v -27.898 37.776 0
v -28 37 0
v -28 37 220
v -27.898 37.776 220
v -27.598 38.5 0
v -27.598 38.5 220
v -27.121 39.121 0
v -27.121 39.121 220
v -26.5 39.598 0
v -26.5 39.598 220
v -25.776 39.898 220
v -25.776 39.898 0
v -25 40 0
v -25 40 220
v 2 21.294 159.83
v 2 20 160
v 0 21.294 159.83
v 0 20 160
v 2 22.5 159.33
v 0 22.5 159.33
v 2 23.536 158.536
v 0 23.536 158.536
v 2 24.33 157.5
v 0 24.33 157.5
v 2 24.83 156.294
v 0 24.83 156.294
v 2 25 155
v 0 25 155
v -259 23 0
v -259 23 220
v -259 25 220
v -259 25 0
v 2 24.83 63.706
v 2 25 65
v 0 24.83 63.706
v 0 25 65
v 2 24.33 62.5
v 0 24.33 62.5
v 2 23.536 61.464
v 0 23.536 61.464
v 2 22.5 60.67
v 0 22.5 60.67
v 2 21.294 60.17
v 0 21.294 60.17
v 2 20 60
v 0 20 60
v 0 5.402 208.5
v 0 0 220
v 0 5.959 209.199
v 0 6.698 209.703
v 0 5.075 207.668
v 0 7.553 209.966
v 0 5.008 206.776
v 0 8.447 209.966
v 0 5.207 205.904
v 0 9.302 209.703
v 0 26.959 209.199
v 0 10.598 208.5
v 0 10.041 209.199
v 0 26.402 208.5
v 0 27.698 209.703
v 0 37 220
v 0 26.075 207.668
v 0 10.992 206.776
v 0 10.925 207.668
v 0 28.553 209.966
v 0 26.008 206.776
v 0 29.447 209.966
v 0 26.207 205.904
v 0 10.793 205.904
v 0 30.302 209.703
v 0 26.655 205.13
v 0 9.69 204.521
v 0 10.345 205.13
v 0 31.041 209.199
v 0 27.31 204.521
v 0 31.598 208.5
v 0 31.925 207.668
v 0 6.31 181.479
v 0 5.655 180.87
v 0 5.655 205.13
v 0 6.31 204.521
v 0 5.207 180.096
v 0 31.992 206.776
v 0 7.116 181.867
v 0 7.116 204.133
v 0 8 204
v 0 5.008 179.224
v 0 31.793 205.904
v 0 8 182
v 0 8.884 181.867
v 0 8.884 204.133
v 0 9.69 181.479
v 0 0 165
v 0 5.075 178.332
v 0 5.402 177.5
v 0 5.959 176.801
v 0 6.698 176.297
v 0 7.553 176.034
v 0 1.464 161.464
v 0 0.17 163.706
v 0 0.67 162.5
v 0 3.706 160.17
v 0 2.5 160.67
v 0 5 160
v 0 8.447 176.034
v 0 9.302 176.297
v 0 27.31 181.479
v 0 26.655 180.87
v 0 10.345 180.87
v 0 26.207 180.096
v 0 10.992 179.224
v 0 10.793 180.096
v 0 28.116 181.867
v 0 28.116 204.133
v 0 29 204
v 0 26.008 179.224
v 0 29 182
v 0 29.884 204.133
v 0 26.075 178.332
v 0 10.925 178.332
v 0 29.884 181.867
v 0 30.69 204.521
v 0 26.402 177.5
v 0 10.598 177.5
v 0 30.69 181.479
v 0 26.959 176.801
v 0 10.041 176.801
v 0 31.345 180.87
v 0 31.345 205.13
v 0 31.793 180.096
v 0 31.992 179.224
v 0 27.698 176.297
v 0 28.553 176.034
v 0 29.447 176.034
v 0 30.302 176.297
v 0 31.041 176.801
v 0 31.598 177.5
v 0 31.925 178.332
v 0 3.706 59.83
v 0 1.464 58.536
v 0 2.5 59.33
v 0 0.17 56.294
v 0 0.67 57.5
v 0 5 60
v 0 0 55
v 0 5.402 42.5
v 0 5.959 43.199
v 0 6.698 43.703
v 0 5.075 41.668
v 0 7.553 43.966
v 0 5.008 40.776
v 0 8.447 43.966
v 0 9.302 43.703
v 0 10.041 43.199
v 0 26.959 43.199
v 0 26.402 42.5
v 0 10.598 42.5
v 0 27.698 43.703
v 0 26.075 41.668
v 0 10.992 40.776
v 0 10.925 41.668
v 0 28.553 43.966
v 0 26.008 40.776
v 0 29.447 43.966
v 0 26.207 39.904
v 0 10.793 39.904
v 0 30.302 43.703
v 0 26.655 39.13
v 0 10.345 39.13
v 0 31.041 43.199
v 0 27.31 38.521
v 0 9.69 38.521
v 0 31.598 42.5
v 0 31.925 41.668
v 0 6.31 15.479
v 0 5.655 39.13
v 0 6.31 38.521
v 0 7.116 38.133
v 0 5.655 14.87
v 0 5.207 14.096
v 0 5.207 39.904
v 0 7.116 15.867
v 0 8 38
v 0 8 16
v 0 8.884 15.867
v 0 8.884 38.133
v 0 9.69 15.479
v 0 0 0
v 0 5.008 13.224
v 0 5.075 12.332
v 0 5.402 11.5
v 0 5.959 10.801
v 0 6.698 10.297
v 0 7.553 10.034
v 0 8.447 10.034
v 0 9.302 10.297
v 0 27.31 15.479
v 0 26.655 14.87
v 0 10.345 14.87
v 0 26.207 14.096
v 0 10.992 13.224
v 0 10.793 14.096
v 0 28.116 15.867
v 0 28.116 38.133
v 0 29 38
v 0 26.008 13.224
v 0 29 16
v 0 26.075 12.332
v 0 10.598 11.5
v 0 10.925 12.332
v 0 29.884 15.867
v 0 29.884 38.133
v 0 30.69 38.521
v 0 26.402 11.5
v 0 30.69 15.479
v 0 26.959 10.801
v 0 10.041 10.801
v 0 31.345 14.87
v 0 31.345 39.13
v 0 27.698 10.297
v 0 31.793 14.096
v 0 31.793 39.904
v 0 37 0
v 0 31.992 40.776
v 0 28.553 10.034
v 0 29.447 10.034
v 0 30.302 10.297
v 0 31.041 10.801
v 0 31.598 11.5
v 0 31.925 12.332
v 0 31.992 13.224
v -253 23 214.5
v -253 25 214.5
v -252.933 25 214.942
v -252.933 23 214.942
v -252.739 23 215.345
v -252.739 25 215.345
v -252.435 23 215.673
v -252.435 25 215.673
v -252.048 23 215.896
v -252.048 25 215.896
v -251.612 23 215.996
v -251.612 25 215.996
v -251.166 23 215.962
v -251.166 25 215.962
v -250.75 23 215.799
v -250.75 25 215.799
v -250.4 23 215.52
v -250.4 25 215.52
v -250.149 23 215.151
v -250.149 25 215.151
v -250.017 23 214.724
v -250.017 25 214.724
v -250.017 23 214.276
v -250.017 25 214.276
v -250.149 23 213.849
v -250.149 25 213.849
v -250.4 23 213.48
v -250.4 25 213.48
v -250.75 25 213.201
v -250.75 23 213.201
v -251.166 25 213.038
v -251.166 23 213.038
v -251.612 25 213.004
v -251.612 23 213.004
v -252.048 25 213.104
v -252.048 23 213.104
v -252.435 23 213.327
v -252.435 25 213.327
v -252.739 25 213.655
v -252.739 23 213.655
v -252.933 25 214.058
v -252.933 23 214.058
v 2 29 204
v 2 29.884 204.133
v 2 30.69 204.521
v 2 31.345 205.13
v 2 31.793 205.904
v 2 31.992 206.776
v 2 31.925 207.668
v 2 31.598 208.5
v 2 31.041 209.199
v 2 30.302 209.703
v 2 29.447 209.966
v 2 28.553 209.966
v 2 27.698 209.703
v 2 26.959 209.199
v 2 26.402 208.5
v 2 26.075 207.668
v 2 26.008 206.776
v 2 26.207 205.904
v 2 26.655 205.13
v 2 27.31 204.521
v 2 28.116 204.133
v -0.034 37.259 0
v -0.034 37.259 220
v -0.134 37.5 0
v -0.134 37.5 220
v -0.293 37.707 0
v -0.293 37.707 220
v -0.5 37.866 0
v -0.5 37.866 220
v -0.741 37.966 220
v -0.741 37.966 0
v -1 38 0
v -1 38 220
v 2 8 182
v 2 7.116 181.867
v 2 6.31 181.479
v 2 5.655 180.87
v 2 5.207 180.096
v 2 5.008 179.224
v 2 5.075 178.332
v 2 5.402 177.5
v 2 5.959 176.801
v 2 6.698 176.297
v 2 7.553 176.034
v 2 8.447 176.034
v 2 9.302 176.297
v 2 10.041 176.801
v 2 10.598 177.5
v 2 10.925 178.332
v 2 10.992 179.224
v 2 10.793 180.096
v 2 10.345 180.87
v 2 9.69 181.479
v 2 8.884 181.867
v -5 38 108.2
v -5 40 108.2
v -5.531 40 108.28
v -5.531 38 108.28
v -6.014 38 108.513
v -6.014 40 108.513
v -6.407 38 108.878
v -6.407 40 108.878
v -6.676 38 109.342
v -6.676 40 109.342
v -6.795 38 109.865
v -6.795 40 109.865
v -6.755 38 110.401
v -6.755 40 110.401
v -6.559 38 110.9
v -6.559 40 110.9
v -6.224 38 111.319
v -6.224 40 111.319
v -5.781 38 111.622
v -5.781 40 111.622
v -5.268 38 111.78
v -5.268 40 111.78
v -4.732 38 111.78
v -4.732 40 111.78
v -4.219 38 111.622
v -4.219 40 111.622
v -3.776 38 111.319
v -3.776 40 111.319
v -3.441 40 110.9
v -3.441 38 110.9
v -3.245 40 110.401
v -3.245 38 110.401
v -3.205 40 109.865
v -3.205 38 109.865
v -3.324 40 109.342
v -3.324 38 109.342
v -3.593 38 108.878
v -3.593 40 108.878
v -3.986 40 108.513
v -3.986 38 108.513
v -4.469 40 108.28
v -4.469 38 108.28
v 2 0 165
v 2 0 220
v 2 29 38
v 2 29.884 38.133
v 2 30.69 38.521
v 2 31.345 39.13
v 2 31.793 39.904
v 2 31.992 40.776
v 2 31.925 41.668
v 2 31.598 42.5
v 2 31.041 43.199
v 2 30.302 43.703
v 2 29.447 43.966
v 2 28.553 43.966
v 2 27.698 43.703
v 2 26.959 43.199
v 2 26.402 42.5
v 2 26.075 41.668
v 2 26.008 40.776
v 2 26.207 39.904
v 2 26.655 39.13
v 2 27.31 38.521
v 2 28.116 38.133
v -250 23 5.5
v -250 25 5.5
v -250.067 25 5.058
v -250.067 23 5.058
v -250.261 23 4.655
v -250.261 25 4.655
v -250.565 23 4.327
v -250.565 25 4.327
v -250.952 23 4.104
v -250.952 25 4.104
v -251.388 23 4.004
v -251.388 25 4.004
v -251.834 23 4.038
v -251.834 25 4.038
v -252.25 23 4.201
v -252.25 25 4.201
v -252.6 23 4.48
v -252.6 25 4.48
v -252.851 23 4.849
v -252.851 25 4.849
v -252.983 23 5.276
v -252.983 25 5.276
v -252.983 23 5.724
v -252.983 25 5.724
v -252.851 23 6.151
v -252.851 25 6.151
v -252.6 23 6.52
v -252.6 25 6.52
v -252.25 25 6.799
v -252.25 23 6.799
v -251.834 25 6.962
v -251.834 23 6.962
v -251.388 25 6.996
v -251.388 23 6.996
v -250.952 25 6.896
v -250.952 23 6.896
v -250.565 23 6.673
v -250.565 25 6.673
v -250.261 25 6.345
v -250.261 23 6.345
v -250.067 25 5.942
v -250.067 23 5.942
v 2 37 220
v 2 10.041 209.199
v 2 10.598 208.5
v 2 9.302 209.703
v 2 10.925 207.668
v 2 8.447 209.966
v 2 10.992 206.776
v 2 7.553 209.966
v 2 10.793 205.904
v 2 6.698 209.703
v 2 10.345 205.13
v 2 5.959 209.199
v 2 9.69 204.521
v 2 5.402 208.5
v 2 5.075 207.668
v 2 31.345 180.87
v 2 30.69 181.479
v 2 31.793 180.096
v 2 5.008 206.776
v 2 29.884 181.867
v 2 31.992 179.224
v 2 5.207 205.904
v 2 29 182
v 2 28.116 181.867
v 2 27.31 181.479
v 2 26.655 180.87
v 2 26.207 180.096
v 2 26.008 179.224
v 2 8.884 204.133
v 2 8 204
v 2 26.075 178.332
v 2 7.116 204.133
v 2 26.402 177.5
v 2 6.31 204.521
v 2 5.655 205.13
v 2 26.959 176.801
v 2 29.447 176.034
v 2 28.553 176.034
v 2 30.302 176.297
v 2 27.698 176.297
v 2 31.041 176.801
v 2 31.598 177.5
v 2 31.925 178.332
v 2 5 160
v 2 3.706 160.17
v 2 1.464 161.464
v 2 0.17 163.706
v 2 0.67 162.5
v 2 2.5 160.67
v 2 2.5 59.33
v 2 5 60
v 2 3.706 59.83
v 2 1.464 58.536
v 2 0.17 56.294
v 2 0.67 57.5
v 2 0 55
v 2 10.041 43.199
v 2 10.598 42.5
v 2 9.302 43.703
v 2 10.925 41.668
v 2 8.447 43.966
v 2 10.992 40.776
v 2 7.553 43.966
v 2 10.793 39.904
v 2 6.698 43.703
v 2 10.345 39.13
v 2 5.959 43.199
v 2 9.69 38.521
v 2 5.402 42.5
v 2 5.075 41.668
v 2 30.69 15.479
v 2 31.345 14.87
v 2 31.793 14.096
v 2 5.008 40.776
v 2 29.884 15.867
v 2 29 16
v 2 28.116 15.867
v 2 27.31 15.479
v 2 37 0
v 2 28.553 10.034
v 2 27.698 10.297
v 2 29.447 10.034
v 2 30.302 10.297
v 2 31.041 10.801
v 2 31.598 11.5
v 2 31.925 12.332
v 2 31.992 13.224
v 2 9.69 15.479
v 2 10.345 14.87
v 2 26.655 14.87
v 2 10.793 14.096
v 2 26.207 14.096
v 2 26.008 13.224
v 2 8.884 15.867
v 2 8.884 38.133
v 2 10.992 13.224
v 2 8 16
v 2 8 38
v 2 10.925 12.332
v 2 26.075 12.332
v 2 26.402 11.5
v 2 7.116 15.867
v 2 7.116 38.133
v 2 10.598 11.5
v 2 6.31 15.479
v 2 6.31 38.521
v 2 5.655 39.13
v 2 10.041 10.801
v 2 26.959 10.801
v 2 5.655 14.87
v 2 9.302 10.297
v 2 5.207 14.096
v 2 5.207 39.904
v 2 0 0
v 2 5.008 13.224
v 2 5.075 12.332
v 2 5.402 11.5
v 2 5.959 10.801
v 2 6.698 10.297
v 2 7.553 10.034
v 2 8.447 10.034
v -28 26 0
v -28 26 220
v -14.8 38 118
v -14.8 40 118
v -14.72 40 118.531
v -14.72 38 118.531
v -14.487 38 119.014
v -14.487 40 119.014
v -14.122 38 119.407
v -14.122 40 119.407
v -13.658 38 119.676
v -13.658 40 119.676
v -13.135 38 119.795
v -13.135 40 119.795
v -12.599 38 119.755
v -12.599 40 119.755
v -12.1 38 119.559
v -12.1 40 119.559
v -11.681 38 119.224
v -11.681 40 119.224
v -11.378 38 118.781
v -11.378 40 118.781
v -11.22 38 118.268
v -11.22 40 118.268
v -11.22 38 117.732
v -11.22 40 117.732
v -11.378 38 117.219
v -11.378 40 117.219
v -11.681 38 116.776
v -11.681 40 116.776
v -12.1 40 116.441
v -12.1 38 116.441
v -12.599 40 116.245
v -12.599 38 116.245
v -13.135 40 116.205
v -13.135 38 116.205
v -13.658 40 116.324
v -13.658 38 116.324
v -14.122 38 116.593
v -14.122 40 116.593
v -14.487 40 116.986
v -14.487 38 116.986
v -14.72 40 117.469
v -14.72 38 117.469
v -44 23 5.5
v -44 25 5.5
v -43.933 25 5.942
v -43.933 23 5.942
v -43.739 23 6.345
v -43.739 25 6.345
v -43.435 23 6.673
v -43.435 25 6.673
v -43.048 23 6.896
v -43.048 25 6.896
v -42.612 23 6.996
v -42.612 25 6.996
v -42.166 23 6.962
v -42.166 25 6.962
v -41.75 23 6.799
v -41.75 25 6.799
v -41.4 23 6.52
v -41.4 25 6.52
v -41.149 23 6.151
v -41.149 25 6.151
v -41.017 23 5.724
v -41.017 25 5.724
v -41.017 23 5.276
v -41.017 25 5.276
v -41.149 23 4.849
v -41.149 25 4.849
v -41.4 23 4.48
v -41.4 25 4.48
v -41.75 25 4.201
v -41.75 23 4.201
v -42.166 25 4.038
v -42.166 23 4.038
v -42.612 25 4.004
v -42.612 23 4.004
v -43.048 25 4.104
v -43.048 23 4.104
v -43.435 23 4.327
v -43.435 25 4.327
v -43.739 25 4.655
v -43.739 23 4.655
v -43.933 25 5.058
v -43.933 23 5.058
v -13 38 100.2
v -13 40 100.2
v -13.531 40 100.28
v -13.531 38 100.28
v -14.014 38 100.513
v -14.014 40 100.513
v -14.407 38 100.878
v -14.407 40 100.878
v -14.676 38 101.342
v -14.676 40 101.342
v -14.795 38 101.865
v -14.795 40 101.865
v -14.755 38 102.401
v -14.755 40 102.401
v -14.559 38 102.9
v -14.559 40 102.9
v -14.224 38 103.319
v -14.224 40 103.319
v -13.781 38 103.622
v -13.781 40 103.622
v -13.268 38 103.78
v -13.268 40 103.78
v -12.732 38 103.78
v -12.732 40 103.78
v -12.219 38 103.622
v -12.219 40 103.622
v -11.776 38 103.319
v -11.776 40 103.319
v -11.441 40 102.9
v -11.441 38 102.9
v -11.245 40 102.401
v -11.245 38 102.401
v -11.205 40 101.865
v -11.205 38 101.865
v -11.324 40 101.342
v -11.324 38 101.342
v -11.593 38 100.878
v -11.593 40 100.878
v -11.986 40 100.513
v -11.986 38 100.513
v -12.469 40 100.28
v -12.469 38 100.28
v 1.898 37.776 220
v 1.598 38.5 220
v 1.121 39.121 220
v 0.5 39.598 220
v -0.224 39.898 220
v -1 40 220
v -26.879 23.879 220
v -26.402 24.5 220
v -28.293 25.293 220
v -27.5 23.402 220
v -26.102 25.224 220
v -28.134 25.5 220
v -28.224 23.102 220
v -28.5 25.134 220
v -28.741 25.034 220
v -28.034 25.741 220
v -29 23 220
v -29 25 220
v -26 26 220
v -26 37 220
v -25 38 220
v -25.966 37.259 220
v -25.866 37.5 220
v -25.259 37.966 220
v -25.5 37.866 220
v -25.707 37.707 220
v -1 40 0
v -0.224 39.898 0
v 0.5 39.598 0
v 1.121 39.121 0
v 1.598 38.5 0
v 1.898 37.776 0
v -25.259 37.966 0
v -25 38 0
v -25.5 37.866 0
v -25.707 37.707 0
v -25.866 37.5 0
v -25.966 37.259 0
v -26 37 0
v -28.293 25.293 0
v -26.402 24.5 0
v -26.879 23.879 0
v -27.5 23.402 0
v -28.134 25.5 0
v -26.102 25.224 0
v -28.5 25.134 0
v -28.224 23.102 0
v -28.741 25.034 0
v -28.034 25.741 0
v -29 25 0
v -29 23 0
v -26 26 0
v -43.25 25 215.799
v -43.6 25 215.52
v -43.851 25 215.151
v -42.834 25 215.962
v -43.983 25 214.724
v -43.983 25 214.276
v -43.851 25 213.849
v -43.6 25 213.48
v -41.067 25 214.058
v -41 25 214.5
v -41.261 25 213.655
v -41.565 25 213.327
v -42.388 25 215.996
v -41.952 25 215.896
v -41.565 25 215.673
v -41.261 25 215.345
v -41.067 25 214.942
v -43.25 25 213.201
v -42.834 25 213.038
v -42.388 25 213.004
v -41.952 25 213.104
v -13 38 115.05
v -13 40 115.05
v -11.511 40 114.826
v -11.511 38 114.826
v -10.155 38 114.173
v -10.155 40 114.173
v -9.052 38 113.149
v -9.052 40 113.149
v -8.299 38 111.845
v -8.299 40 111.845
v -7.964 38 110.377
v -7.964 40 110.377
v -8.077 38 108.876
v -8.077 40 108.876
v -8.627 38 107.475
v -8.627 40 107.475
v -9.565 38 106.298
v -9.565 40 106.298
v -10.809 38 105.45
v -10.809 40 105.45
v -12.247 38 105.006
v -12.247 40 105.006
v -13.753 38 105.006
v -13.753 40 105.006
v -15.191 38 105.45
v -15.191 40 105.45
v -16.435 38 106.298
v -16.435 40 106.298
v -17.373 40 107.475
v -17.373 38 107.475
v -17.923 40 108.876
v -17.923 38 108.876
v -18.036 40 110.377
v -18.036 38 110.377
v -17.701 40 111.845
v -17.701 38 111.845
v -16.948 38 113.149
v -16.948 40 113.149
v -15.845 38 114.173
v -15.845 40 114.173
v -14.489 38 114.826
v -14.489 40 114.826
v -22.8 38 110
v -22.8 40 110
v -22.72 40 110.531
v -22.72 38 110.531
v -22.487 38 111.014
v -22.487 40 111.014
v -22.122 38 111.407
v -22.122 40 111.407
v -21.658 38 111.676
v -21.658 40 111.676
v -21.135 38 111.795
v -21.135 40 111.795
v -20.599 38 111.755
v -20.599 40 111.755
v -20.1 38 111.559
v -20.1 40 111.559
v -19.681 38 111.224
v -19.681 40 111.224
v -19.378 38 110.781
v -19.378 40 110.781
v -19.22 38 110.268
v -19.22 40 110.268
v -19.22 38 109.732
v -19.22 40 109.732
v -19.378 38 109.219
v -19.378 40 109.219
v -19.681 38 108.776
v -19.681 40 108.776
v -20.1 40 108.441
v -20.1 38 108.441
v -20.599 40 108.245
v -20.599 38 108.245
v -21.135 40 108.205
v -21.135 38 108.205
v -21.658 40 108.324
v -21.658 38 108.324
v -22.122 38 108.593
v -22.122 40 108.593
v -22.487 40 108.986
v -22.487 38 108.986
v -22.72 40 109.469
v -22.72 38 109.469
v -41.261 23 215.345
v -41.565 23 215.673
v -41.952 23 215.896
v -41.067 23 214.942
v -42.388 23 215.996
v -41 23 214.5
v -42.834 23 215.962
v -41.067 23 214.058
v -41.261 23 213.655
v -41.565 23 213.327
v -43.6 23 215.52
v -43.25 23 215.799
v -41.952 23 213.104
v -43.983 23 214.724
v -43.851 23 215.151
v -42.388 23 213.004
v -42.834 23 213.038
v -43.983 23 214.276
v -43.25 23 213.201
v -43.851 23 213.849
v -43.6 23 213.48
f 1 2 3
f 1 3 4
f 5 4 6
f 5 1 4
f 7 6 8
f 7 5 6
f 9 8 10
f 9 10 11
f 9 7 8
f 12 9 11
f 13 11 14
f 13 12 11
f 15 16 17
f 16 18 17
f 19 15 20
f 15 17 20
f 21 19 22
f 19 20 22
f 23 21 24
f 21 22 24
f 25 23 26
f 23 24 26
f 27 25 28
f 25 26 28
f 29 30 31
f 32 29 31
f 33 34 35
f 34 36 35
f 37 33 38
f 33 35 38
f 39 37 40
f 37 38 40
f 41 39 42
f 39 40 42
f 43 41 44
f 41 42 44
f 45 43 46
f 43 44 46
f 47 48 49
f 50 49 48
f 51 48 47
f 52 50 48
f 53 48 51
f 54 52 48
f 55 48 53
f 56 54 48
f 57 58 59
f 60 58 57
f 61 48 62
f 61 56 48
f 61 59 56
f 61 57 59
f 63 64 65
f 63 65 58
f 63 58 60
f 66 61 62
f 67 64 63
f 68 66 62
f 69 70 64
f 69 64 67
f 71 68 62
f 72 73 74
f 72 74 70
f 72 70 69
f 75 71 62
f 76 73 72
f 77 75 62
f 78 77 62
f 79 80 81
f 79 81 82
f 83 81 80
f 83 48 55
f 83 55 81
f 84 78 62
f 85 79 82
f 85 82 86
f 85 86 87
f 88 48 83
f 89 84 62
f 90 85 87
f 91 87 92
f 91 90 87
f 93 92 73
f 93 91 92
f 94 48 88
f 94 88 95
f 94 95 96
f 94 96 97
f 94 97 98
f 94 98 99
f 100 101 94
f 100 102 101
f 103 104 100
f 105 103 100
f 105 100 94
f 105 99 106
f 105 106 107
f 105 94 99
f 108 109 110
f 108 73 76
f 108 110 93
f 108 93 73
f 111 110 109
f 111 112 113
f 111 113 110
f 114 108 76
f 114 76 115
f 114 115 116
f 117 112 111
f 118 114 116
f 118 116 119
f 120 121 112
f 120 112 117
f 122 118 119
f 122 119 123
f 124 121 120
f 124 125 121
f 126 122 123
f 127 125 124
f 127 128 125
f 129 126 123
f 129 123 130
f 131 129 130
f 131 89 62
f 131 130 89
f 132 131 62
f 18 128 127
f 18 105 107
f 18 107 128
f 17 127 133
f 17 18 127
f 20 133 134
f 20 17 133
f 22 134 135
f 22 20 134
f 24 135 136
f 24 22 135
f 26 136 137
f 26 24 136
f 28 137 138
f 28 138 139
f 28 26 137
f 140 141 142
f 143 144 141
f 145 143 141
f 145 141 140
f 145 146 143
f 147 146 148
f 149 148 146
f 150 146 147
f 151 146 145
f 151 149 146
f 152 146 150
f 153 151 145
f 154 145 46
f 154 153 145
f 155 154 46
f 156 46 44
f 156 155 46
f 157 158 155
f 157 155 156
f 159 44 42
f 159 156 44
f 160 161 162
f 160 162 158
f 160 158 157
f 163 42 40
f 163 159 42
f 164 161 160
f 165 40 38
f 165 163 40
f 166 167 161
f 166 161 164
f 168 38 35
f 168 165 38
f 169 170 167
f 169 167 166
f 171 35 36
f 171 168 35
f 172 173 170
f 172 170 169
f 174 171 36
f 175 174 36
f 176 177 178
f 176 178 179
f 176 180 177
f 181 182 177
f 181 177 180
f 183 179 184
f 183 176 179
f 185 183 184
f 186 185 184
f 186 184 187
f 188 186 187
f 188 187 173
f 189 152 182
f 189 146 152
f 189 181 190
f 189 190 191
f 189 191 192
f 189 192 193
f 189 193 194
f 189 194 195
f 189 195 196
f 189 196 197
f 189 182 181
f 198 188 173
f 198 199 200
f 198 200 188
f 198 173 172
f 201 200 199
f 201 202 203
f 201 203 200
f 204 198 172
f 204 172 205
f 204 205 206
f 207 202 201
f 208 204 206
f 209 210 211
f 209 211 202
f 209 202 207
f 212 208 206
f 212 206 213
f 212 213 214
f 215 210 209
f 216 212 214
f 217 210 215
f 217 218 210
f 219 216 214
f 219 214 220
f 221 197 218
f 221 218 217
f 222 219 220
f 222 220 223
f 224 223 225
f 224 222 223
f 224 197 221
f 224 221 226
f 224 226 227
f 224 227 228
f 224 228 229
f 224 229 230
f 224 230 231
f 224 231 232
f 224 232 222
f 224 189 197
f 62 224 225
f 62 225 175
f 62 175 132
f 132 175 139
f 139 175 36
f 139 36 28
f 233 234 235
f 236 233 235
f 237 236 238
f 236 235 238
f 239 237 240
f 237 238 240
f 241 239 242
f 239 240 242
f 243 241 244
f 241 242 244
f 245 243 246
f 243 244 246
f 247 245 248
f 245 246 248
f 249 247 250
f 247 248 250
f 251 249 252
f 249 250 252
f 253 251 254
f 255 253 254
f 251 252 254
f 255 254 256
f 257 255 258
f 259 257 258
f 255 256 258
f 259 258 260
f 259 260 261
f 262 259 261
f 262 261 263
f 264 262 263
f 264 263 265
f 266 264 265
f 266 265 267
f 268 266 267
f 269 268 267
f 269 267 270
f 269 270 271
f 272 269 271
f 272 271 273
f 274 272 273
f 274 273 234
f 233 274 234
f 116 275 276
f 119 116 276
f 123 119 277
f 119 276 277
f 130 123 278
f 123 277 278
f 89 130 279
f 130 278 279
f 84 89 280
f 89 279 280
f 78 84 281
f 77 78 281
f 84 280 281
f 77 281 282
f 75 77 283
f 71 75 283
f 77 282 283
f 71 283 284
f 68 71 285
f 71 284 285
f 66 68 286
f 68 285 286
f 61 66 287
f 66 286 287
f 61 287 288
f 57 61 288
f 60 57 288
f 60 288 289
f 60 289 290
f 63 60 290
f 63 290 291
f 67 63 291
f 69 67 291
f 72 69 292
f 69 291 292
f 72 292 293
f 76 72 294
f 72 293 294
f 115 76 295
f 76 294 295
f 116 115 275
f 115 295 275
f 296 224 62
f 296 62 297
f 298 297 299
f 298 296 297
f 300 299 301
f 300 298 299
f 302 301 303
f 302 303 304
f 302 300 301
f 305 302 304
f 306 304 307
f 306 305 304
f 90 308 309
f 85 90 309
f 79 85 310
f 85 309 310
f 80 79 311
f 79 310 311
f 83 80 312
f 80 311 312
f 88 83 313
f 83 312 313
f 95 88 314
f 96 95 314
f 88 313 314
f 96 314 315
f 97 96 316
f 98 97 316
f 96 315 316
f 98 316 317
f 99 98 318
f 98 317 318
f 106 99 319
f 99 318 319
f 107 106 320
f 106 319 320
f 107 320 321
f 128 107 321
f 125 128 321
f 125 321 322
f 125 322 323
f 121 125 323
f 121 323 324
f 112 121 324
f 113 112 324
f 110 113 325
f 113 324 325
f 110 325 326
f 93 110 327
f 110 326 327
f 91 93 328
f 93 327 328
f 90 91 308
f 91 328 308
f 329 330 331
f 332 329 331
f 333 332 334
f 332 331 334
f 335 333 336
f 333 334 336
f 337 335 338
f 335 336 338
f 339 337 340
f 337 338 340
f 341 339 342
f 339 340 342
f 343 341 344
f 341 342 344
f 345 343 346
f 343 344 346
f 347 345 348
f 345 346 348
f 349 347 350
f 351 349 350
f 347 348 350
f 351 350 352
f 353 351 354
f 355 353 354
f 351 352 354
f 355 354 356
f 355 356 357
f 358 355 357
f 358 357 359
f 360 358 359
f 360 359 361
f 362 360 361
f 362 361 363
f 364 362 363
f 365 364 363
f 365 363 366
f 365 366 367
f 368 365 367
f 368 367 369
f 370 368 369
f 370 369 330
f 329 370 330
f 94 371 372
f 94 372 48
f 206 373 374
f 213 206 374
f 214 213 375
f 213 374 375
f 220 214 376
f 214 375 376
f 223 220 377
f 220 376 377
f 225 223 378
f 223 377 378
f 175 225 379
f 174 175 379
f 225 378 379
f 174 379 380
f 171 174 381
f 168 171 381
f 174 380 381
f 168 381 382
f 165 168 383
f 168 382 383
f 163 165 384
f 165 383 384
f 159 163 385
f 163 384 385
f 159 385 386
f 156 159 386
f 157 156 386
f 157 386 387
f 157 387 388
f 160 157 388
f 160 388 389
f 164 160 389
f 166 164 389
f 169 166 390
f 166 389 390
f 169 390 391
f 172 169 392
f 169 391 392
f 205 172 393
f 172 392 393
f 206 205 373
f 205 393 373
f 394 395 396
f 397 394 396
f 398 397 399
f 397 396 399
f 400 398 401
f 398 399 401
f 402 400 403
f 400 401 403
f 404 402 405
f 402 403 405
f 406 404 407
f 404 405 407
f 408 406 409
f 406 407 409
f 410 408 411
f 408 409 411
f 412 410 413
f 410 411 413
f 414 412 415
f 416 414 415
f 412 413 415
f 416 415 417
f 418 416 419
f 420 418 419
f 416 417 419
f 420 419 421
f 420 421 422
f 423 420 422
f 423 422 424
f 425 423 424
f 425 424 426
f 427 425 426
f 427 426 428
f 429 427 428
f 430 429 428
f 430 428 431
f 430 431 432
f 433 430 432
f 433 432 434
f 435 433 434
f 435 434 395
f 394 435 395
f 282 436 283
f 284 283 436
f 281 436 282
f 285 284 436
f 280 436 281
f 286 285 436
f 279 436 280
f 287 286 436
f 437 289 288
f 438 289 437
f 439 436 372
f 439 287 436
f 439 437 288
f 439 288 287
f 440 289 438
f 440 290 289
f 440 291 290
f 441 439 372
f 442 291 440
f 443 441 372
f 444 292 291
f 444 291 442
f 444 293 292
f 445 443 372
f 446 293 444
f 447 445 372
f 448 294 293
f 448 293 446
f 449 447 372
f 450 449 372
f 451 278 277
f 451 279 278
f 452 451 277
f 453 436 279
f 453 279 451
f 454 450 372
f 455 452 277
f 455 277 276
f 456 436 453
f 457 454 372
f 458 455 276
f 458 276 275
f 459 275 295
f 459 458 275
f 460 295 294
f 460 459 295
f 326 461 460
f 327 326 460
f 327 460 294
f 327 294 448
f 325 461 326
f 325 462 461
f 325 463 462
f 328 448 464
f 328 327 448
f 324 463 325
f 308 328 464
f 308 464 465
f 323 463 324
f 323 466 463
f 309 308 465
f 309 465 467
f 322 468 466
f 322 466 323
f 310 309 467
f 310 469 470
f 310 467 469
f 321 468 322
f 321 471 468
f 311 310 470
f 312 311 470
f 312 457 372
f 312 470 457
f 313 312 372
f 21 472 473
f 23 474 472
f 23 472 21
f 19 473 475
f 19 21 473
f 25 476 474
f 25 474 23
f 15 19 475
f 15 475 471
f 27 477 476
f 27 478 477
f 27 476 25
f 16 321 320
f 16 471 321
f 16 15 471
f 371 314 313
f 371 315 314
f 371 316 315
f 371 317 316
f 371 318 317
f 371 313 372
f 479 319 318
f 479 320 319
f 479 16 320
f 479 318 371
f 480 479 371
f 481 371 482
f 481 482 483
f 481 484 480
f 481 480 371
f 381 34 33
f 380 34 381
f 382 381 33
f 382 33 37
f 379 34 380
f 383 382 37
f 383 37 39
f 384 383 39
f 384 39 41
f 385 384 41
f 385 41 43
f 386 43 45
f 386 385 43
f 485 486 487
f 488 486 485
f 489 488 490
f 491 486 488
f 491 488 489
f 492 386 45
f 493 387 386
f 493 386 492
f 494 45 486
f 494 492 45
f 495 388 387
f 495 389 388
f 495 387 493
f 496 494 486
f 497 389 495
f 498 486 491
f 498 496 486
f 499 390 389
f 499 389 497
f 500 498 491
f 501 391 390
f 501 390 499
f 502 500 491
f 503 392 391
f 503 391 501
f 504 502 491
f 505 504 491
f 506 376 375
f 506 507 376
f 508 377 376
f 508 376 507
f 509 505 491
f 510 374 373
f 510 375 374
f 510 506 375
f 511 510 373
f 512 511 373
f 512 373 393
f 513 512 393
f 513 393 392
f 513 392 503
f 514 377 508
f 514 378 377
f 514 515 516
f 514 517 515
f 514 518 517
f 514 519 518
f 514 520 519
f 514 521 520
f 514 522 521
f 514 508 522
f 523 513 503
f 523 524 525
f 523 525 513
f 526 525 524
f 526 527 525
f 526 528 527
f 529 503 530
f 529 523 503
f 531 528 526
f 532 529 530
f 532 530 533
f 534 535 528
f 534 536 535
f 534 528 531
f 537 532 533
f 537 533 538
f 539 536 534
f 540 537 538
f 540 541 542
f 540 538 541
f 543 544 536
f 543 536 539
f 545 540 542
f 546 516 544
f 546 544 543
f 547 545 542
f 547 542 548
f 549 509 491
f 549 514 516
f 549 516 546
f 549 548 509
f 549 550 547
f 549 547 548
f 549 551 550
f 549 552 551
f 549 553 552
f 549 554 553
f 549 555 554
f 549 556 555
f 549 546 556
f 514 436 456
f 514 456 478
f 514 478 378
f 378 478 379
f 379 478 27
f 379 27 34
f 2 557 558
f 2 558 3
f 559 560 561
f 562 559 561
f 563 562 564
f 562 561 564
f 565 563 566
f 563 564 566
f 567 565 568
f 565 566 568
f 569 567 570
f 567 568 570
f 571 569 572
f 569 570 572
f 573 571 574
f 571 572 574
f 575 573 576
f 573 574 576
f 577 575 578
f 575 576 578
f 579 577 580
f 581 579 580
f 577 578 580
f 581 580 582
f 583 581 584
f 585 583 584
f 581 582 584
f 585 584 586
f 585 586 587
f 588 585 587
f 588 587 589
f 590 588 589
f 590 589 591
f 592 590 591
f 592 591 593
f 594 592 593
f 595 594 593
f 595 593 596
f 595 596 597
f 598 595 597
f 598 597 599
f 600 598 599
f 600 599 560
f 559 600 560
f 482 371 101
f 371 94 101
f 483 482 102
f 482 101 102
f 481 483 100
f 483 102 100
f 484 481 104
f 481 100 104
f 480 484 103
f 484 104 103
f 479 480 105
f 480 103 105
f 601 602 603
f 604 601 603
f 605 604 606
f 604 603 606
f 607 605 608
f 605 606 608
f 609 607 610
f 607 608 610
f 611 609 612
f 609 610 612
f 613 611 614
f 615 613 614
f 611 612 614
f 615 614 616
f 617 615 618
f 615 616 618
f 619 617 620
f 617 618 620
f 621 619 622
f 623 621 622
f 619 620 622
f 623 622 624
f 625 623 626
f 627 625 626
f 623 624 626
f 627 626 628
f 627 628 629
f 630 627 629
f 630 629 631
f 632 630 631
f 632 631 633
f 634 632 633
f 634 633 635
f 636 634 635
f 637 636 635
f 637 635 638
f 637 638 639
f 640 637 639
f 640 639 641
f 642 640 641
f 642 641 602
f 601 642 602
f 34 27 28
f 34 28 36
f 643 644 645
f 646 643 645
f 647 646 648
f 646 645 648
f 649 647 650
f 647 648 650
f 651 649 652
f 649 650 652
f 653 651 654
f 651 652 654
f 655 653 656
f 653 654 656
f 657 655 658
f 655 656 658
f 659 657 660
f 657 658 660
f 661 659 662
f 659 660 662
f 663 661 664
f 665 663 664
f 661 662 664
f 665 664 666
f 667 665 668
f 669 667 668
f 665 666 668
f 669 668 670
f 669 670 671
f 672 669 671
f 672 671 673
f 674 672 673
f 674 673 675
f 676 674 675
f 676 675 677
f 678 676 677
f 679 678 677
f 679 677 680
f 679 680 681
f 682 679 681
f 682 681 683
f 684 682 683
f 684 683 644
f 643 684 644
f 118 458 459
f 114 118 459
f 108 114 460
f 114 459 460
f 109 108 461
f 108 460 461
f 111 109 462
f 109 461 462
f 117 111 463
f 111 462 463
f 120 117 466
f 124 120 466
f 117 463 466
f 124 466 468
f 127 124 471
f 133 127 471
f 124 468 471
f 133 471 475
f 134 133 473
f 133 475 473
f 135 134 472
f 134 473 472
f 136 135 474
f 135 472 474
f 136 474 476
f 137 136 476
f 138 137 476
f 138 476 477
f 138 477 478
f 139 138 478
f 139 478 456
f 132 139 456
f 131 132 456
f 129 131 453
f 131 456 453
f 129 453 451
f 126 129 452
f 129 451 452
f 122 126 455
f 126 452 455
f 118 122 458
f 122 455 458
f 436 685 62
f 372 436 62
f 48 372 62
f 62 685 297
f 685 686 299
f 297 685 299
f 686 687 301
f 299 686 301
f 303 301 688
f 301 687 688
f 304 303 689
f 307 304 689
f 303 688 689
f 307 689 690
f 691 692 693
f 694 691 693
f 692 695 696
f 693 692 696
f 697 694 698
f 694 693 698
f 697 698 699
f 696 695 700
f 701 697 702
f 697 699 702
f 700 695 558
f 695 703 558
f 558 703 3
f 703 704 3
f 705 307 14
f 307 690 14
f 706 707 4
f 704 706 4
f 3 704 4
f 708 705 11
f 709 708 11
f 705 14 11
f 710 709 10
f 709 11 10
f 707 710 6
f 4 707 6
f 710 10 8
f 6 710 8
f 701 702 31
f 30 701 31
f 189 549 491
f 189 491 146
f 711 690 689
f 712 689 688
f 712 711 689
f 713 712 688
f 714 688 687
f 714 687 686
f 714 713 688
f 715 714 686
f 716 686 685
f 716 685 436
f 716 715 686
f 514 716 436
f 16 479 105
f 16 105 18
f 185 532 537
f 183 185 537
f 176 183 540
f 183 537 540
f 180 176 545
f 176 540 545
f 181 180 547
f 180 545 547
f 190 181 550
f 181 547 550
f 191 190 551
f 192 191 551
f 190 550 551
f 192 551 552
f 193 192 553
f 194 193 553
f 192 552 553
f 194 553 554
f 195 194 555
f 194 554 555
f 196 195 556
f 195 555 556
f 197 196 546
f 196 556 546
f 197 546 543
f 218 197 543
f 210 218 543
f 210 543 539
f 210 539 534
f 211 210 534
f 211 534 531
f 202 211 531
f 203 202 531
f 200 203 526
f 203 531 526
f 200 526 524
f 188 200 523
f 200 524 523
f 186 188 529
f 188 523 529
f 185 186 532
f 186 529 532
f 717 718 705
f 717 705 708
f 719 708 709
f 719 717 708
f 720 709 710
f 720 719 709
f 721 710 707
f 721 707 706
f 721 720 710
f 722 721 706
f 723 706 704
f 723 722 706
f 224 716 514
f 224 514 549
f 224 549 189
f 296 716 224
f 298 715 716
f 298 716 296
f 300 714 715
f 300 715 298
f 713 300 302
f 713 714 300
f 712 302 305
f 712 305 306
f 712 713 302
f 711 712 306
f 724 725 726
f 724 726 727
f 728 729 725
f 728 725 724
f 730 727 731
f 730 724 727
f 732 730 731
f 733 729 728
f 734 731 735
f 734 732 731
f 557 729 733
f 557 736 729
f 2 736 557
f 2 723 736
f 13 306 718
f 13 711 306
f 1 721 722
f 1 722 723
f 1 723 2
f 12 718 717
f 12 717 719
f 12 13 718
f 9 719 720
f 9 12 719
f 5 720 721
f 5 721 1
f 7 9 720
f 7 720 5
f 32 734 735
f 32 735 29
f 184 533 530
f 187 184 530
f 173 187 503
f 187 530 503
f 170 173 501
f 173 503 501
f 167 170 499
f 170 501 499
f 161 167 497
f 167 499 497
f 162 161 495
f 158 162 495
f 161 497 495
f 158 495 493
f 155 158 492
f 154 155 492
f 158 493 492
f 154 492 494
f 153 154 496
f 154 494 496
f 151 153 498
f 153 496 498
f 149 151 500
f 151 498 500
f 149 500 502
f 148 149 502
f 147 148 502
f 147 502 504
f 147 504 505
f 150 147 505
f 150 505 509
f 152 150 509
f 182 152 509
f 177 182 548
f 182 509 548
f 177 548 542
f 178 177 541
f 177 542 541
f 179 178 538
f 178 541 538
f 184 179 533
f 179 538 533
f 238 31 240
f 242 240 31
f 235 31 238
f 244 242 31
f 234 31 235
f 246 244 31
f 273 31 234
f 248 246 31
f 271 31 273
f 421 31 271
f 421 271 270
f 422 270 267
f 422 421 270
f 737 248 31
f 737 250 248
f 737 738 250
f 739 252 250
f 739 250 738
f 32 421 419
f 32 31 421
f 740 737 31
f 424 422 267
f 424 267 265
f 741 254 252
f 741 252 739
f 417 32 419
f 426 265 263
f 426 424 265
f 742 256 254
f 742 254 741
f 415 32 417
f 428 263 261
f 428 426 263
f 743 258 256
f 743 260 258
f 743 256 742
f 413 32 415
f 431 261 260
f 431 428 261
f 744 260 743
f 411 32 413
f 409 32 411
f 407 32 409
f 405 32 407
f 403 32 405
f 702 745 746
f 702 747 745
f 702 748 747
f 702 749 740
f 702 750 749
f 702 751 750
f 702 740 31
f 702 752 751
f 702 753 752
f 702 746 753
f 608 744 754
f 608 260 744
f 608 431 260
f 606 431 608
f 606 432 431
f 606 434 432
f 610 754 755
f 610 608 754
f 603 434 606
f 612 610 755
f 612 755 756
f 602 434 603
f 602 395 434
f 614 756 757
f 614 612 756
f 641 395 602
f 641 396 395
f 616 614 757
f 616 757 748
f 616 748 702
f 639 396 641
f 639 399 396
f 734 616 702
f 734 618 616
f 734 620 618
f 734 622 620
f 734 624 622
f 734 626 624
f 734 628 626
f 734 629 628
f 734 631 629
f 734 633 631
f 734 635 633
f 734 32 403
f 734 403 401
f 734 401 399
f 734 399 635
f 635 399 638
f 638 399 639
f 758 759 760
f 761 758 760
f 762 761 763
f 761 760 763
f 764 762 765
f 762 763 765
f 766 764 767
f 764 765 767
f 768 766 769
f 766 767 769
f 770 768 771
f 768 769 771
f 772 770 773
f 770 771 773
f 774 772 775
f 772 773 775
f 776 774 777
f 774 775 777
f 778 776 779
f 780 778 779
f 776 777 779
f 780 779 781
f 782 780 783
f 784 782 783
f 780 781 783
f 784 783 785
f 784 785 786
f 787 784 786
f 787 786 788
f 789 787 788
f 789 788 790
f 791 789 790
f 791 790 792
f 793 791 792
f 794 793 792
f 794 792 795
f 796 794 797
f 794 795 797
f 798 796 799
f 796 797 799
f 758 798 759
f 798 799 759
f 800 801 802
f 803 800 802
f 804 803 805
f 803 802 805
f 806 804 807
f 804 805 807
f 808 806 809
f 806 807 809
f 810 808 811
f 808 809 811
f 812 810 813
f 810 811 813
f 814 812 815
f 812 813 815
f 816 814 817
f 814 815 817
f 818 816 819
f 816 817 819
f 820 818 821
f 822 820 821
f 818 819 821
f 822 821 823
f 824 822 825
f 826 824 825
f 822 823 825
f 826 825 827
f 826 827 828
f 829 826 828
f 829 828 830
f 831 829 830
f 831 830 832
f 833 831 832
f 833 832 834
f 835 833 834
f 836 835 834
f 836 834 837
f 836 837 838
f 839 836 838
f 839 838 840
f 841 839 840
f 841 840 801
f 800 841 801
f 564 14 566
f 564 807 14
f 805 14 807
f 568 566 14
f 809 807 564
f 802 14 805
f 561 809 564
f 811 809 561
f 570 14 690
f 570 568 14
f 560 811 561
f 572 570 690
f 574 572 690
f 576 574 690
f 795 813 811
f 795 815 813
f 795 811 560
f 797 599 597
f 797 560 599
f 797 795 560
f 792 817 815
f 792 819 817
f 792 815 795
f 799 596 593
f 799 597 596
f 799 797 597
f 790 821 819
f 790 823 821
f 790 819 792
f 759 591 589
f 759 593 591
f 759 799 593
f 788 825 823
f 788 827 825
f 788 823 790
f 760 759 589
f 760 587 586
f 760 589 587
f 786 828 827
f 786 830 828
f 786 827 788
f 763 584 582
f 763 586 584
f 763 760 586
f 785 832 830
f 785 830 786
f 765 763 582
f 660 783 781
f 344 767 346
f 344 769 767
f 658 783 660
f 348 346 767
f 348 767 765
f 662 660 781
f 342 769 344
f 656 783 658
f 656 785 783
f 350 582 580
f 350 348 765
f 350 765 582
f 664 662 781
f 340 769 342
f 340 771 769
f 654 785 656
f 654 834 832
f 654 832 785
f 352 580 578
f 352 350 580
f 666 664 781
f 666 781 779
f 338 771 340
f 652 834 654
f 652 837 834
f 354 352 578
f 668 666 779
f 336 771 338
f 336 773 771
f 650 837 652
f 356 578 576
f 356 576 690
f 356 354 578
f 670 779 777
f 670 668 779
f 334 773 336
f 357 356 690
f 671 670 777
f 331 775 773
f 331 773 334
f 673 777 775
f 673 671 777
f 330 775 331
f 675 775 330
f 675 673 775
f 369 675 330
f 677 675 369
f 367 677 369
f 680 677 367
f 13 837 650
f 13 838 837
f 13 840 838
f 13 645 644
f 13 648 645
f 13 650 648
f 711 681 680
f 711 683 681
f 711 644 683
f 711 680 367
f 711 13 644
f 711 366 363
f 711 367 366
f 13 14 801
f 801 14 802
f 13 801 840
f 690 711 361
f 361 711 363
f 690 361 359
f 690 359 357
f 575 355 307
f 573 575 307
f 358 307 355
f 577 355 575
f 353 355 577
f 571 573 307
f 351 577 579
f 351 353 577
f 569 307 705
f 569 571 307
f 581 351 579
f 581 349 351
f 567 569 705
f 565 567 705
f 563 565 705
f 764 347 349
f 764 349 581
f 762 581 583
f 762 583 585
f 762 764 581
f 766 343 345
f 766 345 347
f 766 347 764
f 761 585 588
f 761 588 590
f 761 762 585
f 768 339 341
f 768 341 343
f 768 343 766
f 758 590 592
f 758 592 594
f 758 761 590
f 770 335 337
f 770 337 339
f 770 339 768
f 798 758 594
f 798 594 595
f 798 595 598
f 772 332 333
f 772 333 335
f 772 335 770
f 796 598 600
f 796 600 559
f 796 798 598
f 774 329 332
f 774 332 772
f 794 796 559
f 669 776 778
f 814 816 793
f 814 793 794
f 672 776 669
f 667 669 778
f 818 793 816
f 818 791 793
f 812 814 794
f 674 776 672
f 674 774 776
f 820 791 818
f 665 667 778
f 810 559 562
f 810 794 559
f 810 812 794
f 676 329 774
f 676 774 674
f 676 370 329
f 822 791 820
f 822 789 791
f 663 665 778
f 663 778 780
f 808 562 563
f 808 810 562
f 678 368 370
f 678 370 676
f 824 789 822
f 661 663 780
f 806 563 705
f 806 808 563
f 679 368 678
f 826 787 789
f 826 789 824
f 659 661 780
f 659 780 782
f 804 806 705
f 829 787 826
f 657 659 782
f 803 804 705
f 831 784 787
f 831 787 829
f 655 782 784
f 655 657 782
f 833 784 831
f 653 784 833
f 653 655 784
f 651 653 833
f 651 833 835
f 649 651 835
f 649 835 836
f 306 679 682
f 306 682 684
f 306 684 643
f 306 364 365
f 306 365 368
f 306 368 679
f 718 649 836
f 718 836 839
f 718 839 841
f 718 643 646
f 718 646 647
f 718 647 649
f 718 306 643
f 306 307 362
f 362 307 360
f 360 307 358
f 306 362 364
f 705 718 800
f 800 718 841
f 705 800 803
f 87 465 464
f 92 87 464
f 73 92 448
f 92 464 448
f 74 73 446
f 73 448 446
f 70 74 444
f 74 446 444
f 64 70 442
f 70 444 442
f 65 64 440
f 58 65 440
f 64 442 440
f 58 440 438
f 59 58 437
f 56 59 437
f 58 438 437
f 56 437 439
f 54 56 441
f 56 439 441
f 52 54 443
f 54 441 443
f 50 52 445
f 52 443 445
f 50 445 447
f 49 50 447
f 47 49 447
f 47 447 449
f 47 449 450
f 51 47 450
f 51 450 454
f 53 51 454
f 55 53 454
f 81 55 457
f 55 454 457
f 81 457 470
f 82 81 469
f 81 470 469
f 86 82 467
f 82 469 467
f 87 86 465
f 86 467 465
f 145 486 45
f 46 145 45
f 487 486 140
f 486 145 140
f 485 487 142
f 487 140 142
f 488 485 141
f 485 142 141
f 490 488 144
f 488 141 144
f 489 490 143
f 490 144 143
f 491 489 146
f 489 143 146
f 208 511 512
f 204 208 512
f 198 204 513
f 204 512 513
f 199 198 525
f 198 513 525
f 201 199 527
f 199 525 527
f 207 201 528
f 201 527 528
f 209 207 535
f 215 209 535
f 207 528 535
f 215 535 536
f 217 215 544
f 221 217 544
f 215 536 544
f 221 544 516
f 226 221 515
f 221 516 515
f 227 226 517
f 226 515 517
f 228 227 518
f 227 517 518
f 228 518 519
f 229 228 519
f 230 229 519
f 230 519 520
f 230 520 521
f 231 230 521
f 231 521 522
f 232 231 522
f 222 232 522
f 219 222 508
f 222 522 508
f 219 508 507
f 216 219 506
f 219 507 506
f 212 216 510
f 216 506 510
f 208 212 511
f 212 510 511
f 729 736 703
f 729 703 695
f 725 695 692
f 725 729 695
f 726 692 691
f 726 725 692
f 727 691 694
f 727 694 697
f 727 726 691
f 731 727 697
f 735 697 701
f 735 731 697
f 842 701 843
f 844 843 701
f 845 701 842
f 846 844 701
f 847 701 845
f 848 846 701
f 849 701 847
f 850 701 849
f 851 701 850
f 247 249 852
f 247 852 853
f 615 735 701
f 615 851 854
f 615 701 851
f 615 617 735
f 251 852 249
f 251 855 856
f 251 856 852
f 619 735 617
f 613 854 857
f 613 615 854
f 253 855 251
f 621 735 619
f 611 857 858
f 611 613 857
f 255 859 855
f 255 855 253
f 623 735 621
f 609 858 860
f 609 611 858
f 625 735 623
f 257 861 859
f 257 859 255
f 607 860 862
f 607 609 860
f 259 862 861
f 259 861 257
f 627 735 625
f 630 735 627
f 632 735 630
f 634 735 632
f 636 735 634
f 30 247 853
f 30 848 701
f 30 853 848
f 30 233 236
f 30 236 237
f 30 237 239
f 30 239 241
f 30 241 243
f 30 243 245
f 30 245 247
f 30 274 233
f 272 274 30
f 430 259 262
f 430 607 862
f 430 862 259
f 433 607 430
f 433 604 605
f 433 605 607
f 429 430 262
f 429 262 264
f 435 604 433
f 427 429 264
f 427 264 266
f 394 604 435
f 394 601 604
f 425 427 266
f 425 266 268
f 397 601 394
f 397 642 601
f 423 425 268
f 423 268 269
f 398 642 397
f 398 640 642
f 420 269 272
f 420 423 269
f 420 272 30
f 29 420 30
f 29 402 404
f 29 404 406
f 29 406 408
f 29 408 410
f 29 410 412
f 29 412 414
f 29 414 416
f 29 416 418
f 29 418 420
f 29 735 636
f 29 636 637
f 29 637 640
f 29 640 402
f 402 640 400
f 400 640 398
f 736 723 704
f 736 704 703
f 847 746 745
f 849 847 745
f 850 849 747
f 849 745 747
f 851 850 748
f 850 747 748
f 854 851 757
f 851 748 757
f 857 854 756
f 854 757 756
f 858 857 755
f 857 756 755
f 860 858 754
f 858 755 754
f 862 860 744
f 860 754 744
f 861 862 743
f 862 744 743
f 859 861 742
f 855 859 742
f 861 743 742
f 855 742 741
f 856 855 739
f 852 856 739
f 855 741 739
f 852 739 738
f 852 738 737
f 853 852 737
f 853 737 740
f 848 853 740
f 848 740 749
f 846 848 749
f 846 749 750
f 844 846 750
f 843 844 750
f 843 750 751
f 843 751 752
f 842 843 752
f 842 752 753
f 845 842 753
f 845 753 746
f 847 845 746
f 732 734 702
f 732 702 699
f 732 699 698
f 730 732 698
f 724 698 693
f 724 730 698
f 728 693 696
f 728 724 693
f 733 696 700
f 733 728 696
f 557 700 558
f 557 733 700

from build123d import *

# Parameters (mm, degrees)
BASE_FLANGE1_DEPTH = 220
SKETCH6_R          = 1.8
CUT_EXTRUDE1_DEPTH = 343.171009877
SKETCH7_R          = 1.5
CUT_EXTRUDE2_DEPTH = 341.743305143
SKETCH8_R          = 3
CUT_EXTRUDE3_DEPTH = 2
SKETCH10_W         = 100
SKETCH10_H         = 25
CUT_EXTRUDE8_DEPTH = 2
FILLET1_R          = 5
SKETCH11_R         = 5.05
CUT_EXTRUDE9_DEPTH = 2


# Sheet-metal steps are written as plain solids
with BuildPart() as part:
    # Sketch1 → Base-Flange1 (new body)
    with BuildSketch(Plane.XY):
        with BuildLine():
            Line((0, 0), (0, 37))
            ThreePointArc((0, 37), (-0.292893219, 37.707106781), (-1, 38))
            Line((-1, 38), (-25, 38))
            ThreePointArc((-25, 38), (-25.707106781, 37.707106781), (-26, 37))
            Line((-26, 37), (-26, 26))
            ThreePointArc((-26, 26), (-26.878679656, 23.878679656), (-29, 23))
            Line((-29, 23), (-259, 23))
            Line((-259, 23), (-259, 25))
            Line((-259, 25), (-29, 25))
            ThreePointArc((-29, 25), (-28.292893219, 25.292893219), (-28, 26))
            Line((-28, 26), (-28, 37))
            ThreePointArc((-28, 37), (-27.121320344, 39.121320344), (-25, 40))
            Line((-25, 40), (-1, 40))
            ThreePointArc((-1, 40), (1.121320344, 39.121320344), (2, 37))
            Line((2, 37), (2, 0))
            Line((2, 0), (0, 0))
        make_face()
    extrude(amount=BASE_FLANGE1_DEPTH)

    # Sketch6 → Cut-Extrude1 (cut, through all)
    with BuildSketch(Plane(origin=(0, 40, 0), x_dir=(1, 0, 0), z_dir=(0, 1, 0))):
        with Locations(Location((-21, -110, 0), (0, 0, 180))):
            Circle(SKETCH6_R)
        with Locations(Location((-5, -110, 0), (0, 0, 90))):
            Circle(SKETCH6_R)
        with Locations(Location((-13, -118, 0), (0, 0, 180))):
            Circle(SKETCH6_R)
        with Locations(Location((-13, -102, 0), (0, 0, 90))):
            Circle(SKETCH6_R)
    extrude(amount=-CUT_EXTRUDE1_DEPTH, mode=Mode.SUBTRACT)

    # Sketch7 → Cut-Extrude2 (cut, through all)
    with BuildSketch(Plane(origin=(0, 25, 0), x_dir=(1, 0, 0), z_dir=(0, 1, 0))):
        with Locations(Location((-42.5, -5.5, 0), (0, 0, 180))):
            Circle(SKETCH7_R)
        with Locations((-251.5, -5.5)):
            Circle(SKETCH7_R)
        with Locations(Location((-251.5, -214.5, 0), (0, 0, 180))):
            Circle(SKETCH7_R)
        with Locations((-42.5, -214.5)):
            Circle(SKETCH7_R)
    extrude(amount=-CUT_EXTRUDE2_DEPTH, mode=Mode.SUBTRACT)

    # Sketch8 → Cut-Extrude3 (cut)
    with BuildSketch(Plane(origin=(2, 0, 0), x_dir=(0, 0, -1), z_dir=(1, 0, 0))):
        with Locations((-207, 8)):
            Circle(SKETCH8_R)
        with Locations((-207, 29)):
            Circle(SKETCH8_R)
        with Locations(Location((-179, 29, 0), (0, 0, 180))):
            Circle(SKETCH8_R)
        with Locations(Location((-179, 8, 0), (0, 0, 180))):
            Circle(SKETCH8_R)
        with Locations((-41, 8)):
            Circle(SKETCH8_R)
        with Locations((-41, 29)):
            Circle(SKETCH8_R)
        with Locations(Location((-13, 29, 0), (0, 0, 180))):
            Circle(SKETCH8_R)
        with Locations(Location((-13, 8, 0), (0, 0, 180))):
            Circle(SKETCH8_R)
    extrude(amount=-CUT_EXTRUDE3_DEPTH, mode=Mode.SUBTRACT)

    # Sketch10 → Cut-Extrude8 (cut)
    with BuildSketch(Plane(origin=(2, 0, 0), x_dir=(0, 0, -1), z_dir=(1, 0, 0))):
        with Locations((-110, 12.5)):
            Rectangle(SKETCH10_W, SKETCH10_H)
    extrude(amount=-CUT_EXTRUDE8_DEPTH, mode=Mode.SUBTRACT)

    # Fillet1
    fillet1_edges = [part.edges().sort_by_distance(p)[0] for p in [
        (1, 0, 60),
        (1, 0, 160),
        (1, 25, 160),
        (1, 25, 60),
    ]]
    fillet(fillet1_edges, radius=FILLET1_R)

    # Sketch11 → Cut-Extrude9 (cut)
    with BuildSketch(Plane(origin=(0, 40, 0), x_dir=(1, 0, 0), z_dir=(0, 1, 0))):
        with Locations(Location((-13, -110, 0), (0, 0, 270))):
            Circle(SKETCH11_R)
    extrude(amount=-CUT_EXTRUDE9_DEPTH, mode=Mode.SUBTRACT)


solid = part.part
